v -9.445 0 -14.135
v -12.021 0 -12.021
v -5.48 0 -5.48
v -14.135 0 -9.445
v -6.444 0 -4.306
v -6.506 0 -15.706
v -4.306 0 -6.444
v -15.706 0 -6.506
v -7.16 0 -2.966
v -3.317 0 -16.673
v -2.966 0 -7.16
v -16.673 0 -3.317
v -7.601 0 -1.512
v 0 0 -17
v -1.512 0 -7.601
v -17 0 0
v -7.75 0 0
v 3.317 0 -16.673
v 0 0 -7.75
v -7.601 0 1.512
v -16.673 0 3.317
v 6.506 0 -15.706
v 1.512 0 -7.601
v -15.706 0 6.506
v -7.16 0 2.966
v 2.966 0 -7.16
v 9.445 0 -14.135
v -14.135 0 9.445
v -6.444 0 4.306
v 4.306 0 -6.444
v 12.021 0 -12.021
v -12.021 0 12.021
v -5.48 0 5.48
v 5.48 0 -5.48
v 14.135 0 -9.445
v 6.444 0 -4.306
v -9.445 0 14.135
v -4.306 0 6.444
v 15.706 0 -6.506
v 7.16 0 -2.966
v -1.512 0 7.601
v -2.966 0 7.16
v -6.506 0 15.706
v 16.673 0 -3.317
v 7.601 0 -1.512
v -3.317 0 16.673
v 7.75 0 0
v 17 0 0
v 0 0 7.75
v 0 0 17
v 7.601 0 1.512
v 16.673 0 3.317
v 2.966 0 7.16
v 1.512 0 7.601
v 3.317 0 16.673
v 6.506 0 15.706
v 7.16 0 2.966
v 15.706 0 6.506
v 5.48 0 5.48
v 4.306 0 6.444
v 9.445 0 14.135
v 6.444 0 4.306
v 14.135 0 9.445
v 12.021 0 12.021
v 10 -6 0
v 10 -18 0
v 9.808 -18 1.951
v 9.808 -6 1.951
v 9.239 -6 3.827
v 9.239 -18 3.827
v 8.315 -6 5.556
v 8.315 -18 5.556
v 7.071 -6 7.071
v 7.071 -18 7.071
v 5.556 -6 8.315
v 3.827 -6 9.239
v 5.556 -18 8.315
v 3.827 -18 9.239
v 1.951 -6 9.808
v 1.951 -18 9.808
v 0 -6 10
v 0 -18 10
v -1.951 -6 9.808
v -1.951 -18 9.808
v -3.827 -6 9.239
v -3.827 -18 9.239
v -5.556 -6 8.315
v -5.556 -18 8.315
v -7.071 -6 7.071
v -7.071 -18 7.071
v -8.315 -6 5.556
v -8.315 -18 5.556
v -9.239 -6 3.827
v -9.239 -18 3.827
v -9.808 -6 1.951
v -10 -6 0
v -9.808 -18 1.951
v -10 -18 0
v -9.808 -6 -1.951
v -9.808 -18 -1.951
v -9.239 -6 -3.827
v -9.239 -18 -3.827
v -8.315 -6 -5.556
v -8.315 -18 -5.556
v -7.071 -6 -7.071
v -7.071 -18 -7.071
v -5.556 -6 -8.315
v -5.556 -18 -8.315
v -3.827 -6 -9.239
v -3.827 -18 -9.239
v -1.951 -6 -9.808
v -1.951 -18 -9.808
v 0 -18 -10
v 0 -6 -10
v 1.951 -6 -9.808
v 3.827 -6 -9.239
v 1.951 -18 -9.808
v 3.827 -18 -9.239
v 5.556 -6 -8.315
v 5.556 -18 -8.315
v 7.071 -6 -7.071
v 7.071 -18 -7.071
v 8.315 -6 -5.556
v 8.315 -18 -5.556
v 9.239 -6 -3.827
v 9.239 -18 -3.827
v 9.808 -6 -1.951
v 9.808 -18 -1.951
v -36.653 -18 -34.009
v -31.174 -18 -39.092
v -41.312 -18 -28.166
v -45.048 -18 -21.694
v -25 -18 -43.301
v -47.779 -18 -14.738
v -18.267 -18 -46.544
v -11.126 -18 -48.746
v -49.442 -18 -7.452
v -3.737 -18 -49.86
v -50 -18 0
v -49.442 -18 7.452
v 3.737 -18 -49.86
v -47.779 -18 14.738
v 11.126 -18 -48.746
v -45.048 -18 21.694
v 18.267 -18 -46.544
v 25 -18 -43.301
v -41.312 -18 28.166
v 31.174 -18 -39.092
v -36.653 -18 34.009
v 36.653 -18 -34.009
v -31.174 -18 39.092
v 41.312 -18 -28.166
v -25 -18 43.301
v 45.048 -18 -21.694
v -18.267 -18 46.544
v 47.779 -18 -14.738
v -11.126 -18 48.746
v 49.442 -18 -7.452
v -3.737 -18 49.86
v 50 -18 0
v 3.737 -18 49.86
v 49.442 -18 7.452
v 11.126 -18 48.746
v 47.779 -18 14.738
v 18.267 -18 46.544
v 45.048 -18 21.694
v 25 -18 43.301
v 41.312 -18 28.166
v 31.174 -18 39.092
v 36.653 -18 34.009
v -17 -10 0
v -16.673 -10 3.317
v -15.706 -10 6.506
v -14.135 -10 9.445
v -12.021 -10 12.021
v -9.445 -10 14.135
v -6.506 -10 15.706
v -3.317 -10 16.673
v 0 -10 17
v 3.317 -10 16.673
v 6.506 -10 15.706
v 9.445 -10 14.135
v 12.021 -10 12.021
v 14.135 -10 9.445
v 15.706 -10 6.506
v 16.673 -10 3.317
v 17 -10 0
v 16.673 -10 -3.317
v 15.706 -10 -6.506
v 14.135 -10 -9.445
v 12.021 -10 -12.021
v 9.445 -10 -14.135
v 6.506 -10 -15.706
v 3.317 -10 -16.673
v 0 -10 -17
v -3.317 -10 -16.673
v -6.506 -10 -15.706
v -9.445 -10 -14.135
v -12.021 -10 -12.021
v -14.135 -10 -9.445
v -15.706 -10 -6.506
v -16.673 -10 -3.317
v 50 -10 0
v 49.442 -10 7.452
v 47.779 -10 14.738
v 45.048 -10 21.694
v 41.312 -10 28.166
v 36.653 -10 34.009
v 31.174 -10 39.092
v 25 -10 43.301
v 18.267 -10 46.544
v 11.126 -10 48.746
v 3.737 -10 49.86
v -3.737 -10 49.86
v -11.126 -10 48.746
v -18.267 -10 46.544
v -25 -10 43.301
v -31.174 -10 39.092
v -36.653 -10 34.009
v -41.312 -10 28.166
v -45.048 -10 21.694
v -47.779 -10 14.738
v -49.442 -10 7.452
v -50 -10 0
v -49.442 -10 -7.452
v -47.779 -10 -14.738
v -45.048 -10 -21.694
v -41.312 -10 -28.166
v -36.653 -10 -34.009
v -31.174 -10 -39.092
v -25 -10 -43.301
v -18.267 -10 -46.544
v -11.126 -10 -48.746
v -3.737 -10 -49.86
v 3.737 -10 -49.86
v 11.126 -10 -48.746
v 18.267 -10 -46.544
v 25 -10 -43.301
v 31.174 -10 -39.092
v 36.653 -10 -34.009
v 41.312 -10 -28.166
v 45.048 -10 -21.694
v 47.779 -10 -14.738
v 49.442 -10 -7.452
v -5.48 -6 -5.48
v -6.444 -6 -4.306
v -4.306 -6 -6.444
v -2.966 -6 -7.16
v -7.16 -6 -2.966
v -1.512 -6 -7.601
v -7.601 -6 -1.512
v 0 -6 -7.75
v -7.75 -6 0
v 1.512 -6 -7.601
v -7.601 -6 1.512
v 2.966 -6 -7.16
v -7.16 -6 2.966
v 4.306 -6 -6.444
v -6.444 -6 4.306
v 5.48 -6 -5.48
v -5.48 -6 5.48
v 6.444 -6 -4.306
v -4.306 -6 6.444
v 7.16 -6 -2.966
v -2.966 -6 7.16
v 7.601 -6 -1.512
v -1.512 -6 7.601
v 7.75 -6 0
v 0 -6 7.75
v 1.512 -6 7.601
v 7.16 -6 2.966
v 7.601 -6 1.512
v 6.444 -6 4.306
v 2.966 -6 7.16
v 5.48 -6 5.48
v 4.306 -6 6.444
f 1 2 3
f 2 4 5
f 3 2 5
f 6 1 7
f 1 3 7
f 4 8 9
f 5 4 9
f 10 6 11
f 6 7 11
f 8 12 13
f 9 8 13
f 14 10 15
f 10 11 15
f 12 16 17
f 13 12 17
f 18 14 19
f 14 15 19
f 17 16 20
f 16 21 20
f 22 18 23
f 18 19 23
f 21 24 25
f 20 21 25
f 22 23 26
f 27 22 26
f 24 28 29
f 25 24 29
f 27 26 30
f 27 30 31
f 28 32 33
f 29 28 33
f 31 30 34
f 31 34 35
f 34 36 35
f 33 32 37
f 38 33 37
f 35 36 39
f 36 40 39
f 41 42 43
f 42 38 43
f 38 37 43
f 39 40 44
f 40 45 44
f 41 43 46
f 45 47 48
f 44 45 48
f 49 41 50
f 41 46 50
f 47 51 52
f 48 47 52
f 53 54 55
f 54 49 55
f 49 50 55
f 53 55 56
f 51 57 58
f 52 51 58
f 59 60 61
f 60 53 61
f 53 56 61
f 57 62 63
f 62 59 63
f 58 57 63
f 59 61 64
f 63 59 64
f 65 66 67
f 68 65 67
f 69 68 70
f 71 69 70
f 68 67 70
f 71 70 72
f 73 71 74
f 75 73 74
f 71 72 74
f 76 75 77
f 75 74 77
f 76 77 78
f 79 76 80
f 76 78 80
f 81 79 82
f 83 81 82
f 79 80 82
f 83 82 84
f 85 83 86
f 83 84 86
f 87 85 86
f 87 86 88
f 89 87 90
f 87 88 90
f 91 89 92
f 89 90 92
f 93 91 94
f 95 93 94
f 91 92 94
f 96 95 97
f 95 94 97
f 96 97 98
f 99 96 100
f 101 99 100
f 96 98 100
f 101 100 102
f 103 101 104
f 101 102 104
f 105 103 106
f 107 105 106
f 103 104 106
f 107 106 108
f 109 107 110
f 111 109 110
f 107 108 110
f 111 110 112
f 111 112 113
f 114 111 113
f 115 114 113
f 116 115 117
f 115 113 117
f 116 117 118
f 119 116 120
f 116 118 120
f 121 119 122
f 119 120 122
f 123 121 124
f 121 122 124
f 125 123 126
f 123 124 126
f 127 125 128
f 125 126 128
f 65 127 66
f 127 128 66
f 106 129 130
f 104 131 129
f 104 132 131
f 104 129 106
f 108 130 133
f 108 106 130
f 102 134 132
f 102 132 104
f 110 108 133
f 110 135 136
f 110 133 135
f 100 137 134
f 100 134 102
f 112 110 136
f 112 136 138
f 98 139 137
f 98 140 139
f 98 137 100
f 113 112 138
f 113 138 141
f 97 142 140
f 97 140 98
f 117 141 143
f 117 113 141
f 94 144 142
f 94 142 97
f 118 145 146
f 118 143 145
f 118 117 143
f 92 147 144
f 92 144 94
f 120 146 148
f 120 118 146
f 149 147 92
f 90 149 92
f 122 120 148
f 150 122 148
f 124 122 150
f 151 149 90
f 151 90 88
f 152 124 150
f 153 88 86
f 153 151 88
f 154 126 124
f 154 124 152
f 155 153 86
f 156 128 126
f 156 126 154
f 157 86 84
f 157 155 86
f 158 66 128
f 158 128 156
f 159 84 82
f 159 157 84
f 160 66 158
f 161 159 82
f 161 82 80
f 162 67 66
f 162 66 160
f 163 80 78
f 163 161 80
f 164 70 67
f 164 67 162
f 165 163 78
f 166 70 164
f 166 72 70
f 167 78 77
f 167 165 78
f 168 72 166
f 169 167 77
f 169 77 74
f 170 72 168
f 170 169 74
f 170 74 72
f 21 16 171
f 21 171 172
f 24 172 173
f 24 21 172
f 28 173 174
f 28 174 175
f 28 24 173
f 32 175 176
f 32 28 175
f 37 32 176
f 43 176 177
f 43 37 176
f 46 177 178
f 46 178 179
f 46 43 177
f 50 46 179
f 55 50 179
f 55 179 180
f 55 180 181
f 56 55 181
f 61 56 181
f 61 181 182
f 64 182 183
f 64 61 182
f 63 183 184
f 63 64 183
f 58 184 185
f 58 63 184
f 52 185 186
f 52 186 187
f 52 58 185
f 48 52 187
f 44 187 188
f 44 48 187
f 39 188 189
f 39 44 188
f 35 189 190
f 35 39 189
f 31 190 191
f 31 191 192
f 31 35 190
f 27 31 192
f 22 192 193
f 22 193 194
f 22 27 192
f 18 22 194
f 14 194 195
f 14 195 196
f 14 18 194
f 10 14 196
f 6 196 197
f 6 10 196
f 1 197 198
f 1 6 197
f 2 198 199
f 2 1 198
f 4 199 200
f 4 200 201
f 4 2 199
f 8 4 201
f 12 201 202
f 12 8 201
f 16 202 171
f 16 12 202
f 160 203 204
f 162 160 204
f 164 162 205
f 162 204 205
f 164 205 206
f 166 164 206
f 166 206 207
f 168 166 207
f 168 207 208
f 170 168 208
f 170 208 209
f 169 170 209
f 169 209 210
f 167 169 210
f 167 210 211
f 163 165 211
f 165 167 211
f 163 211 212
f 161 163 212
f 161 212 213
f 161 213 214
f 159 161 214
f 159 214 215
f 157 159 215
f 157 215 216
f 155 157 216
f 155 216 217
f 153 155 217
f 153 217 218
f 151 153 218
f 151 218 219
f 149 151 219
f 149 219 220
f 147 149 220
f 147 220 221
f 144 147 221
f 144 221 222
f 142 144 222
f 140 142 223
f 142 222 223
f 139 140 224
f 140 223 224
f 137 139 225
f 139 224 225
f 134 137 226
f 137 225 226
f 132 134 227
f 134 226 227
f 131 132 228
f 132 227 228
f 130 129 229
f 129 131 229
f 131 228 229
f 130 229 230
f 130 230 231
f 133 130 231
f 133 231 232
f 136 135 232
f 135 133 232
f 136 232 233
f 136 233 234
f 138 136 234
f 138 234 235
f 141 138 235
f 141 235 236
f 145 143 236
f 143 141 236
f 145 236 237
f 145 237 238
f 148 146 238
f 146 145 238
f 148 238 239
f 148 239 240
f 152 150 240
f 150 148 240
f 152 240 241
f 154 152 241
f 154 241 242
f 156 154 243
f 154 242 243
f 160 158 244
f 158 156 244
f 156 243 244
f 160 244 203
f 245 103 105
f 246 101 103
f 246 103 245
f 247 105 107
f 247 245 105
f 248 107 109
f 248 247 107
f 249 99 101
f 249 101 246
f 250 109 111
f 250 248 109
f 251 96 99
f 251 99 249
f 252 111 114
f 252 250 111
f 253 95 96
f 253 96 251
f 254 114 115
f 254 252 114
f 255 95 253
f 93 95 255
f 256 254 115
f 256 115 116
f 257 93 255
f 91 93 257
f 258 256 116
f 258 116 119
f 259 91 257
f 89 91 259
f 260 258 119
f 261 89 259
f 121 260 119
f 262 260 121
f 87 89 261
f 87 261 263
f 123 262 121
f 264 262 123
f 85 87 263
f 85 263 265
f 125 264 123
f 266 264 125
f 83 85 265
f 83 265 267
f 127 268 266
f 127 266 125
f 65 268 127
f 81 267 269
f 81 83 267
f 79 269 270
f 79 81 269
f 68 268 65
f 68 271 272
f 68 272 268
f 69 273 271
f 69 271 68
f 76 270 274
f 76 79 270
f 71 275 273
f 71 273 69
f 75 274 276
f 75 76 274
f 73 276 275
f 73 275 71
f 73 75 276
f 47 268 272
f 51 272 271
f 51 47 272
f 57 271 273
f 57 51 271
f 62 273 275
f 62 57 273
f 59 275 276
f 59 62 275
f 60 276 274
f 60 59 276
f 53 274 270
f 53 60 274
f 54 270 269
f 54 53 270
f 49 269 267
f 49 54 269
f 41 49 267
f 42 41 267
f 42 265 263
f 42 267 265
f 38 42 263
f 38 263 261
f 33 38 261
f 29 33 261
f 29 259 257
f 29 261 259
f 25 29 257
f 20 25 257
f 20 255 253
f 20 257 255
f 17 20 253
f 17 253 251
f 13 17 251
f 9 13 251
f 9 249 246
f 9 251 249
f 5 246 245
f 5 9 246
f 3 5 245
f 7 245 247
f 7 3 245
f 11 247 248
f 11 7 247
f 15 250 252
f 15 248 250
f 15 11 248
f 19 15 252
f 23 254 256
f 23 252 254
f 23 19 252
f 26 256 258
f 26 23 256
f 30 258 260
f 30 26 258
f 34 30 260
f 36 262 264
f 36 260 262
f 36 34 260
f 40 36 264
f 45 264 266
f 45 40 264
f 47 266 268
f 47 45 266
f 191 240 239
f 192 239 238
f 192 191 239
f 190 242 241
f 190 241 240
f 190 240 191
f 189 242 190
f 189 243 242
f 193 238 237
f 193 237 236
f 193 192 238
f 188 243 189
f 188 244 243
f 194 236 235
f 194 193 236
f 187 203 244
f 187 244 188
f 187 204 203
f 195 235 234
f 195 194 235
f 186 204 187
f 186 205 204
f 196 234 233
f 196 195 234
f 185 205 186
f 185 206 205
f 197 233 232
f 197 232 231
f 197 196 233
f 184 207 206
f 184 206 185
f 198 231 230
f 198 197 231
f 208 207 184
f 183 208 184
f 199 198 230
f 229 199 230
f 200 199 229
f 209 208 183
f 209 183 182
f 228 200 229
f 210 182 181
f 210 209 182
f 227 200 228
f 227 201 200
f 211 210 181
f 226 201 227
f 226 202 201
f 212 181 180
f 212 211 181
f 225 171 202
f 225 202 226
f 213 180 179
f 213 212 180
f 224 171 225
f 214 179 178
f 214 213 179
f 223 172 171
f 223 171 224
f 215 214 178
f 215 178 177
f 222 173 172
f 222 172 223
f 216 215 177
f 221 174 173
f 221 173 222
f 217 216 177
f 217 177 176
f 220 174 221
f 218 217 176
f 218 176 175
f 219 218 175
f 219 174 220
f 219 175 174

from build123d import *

# Parameters (mm, degrees)
F0_R     = 50
F1_DEPTH = 43
F2_R     = 144.3739928915
F2_R_2   = 50
F2_R_3   = 17
F3_DEPTH = 10
F4_R     = 61.7610309049
F5_DEPTH = 25
F6_R     = 10
F7_DEPTH = 12
F8_R     = 7.75
F9_DEPTH = 179


with BuildPart() as f1:
    # F0 (on Front) → F1 (new body)
    with BuildSketch(Plane.XZ):
        Circle(F0_R)
    extrude(amount=F1_DEPTH)

    # F2 (on face) → F3 (cut)
    with BuildSketch(Plane(origin=(0, 0, 0), x_dir=(-1, 0, 0), z_dir=(0, 1, 0))):
        Circle(F2_R)
        Circle(F2_R_2, mode=Mode.SUBTRACT)
        Circle(F2_R_2)
        Circle(F2_R_3, mode=Mode.SUBTRACT)
    extrude(amount=-F3_DEPTH, mode=Mode.SUBTRACT)

    # F4 (on face) → F5 (cut)
    with BuildSketch(Plane.XZ.offset(43)):
        Circle(F4_R)
    extrude(amount=-F5_DEPTH, mode=Mode.SUBTRACT)

    # F6 (on face) → F7 (cut)
    with BuildSketch(Plane.XZ.offset(18)):
        Circle(F6_R)
    extrude(amount=-F7_DEPTH, mode=Mode.SUBTRACT)

    # F8 (on Front) → F9 (cut)
    with BuildSketch(Plane.XZ):
        Circle(F8_R)
    extrude(amount=F9_DEPTH, mode=Mode.SUBTRACT)


solid = f1.part
